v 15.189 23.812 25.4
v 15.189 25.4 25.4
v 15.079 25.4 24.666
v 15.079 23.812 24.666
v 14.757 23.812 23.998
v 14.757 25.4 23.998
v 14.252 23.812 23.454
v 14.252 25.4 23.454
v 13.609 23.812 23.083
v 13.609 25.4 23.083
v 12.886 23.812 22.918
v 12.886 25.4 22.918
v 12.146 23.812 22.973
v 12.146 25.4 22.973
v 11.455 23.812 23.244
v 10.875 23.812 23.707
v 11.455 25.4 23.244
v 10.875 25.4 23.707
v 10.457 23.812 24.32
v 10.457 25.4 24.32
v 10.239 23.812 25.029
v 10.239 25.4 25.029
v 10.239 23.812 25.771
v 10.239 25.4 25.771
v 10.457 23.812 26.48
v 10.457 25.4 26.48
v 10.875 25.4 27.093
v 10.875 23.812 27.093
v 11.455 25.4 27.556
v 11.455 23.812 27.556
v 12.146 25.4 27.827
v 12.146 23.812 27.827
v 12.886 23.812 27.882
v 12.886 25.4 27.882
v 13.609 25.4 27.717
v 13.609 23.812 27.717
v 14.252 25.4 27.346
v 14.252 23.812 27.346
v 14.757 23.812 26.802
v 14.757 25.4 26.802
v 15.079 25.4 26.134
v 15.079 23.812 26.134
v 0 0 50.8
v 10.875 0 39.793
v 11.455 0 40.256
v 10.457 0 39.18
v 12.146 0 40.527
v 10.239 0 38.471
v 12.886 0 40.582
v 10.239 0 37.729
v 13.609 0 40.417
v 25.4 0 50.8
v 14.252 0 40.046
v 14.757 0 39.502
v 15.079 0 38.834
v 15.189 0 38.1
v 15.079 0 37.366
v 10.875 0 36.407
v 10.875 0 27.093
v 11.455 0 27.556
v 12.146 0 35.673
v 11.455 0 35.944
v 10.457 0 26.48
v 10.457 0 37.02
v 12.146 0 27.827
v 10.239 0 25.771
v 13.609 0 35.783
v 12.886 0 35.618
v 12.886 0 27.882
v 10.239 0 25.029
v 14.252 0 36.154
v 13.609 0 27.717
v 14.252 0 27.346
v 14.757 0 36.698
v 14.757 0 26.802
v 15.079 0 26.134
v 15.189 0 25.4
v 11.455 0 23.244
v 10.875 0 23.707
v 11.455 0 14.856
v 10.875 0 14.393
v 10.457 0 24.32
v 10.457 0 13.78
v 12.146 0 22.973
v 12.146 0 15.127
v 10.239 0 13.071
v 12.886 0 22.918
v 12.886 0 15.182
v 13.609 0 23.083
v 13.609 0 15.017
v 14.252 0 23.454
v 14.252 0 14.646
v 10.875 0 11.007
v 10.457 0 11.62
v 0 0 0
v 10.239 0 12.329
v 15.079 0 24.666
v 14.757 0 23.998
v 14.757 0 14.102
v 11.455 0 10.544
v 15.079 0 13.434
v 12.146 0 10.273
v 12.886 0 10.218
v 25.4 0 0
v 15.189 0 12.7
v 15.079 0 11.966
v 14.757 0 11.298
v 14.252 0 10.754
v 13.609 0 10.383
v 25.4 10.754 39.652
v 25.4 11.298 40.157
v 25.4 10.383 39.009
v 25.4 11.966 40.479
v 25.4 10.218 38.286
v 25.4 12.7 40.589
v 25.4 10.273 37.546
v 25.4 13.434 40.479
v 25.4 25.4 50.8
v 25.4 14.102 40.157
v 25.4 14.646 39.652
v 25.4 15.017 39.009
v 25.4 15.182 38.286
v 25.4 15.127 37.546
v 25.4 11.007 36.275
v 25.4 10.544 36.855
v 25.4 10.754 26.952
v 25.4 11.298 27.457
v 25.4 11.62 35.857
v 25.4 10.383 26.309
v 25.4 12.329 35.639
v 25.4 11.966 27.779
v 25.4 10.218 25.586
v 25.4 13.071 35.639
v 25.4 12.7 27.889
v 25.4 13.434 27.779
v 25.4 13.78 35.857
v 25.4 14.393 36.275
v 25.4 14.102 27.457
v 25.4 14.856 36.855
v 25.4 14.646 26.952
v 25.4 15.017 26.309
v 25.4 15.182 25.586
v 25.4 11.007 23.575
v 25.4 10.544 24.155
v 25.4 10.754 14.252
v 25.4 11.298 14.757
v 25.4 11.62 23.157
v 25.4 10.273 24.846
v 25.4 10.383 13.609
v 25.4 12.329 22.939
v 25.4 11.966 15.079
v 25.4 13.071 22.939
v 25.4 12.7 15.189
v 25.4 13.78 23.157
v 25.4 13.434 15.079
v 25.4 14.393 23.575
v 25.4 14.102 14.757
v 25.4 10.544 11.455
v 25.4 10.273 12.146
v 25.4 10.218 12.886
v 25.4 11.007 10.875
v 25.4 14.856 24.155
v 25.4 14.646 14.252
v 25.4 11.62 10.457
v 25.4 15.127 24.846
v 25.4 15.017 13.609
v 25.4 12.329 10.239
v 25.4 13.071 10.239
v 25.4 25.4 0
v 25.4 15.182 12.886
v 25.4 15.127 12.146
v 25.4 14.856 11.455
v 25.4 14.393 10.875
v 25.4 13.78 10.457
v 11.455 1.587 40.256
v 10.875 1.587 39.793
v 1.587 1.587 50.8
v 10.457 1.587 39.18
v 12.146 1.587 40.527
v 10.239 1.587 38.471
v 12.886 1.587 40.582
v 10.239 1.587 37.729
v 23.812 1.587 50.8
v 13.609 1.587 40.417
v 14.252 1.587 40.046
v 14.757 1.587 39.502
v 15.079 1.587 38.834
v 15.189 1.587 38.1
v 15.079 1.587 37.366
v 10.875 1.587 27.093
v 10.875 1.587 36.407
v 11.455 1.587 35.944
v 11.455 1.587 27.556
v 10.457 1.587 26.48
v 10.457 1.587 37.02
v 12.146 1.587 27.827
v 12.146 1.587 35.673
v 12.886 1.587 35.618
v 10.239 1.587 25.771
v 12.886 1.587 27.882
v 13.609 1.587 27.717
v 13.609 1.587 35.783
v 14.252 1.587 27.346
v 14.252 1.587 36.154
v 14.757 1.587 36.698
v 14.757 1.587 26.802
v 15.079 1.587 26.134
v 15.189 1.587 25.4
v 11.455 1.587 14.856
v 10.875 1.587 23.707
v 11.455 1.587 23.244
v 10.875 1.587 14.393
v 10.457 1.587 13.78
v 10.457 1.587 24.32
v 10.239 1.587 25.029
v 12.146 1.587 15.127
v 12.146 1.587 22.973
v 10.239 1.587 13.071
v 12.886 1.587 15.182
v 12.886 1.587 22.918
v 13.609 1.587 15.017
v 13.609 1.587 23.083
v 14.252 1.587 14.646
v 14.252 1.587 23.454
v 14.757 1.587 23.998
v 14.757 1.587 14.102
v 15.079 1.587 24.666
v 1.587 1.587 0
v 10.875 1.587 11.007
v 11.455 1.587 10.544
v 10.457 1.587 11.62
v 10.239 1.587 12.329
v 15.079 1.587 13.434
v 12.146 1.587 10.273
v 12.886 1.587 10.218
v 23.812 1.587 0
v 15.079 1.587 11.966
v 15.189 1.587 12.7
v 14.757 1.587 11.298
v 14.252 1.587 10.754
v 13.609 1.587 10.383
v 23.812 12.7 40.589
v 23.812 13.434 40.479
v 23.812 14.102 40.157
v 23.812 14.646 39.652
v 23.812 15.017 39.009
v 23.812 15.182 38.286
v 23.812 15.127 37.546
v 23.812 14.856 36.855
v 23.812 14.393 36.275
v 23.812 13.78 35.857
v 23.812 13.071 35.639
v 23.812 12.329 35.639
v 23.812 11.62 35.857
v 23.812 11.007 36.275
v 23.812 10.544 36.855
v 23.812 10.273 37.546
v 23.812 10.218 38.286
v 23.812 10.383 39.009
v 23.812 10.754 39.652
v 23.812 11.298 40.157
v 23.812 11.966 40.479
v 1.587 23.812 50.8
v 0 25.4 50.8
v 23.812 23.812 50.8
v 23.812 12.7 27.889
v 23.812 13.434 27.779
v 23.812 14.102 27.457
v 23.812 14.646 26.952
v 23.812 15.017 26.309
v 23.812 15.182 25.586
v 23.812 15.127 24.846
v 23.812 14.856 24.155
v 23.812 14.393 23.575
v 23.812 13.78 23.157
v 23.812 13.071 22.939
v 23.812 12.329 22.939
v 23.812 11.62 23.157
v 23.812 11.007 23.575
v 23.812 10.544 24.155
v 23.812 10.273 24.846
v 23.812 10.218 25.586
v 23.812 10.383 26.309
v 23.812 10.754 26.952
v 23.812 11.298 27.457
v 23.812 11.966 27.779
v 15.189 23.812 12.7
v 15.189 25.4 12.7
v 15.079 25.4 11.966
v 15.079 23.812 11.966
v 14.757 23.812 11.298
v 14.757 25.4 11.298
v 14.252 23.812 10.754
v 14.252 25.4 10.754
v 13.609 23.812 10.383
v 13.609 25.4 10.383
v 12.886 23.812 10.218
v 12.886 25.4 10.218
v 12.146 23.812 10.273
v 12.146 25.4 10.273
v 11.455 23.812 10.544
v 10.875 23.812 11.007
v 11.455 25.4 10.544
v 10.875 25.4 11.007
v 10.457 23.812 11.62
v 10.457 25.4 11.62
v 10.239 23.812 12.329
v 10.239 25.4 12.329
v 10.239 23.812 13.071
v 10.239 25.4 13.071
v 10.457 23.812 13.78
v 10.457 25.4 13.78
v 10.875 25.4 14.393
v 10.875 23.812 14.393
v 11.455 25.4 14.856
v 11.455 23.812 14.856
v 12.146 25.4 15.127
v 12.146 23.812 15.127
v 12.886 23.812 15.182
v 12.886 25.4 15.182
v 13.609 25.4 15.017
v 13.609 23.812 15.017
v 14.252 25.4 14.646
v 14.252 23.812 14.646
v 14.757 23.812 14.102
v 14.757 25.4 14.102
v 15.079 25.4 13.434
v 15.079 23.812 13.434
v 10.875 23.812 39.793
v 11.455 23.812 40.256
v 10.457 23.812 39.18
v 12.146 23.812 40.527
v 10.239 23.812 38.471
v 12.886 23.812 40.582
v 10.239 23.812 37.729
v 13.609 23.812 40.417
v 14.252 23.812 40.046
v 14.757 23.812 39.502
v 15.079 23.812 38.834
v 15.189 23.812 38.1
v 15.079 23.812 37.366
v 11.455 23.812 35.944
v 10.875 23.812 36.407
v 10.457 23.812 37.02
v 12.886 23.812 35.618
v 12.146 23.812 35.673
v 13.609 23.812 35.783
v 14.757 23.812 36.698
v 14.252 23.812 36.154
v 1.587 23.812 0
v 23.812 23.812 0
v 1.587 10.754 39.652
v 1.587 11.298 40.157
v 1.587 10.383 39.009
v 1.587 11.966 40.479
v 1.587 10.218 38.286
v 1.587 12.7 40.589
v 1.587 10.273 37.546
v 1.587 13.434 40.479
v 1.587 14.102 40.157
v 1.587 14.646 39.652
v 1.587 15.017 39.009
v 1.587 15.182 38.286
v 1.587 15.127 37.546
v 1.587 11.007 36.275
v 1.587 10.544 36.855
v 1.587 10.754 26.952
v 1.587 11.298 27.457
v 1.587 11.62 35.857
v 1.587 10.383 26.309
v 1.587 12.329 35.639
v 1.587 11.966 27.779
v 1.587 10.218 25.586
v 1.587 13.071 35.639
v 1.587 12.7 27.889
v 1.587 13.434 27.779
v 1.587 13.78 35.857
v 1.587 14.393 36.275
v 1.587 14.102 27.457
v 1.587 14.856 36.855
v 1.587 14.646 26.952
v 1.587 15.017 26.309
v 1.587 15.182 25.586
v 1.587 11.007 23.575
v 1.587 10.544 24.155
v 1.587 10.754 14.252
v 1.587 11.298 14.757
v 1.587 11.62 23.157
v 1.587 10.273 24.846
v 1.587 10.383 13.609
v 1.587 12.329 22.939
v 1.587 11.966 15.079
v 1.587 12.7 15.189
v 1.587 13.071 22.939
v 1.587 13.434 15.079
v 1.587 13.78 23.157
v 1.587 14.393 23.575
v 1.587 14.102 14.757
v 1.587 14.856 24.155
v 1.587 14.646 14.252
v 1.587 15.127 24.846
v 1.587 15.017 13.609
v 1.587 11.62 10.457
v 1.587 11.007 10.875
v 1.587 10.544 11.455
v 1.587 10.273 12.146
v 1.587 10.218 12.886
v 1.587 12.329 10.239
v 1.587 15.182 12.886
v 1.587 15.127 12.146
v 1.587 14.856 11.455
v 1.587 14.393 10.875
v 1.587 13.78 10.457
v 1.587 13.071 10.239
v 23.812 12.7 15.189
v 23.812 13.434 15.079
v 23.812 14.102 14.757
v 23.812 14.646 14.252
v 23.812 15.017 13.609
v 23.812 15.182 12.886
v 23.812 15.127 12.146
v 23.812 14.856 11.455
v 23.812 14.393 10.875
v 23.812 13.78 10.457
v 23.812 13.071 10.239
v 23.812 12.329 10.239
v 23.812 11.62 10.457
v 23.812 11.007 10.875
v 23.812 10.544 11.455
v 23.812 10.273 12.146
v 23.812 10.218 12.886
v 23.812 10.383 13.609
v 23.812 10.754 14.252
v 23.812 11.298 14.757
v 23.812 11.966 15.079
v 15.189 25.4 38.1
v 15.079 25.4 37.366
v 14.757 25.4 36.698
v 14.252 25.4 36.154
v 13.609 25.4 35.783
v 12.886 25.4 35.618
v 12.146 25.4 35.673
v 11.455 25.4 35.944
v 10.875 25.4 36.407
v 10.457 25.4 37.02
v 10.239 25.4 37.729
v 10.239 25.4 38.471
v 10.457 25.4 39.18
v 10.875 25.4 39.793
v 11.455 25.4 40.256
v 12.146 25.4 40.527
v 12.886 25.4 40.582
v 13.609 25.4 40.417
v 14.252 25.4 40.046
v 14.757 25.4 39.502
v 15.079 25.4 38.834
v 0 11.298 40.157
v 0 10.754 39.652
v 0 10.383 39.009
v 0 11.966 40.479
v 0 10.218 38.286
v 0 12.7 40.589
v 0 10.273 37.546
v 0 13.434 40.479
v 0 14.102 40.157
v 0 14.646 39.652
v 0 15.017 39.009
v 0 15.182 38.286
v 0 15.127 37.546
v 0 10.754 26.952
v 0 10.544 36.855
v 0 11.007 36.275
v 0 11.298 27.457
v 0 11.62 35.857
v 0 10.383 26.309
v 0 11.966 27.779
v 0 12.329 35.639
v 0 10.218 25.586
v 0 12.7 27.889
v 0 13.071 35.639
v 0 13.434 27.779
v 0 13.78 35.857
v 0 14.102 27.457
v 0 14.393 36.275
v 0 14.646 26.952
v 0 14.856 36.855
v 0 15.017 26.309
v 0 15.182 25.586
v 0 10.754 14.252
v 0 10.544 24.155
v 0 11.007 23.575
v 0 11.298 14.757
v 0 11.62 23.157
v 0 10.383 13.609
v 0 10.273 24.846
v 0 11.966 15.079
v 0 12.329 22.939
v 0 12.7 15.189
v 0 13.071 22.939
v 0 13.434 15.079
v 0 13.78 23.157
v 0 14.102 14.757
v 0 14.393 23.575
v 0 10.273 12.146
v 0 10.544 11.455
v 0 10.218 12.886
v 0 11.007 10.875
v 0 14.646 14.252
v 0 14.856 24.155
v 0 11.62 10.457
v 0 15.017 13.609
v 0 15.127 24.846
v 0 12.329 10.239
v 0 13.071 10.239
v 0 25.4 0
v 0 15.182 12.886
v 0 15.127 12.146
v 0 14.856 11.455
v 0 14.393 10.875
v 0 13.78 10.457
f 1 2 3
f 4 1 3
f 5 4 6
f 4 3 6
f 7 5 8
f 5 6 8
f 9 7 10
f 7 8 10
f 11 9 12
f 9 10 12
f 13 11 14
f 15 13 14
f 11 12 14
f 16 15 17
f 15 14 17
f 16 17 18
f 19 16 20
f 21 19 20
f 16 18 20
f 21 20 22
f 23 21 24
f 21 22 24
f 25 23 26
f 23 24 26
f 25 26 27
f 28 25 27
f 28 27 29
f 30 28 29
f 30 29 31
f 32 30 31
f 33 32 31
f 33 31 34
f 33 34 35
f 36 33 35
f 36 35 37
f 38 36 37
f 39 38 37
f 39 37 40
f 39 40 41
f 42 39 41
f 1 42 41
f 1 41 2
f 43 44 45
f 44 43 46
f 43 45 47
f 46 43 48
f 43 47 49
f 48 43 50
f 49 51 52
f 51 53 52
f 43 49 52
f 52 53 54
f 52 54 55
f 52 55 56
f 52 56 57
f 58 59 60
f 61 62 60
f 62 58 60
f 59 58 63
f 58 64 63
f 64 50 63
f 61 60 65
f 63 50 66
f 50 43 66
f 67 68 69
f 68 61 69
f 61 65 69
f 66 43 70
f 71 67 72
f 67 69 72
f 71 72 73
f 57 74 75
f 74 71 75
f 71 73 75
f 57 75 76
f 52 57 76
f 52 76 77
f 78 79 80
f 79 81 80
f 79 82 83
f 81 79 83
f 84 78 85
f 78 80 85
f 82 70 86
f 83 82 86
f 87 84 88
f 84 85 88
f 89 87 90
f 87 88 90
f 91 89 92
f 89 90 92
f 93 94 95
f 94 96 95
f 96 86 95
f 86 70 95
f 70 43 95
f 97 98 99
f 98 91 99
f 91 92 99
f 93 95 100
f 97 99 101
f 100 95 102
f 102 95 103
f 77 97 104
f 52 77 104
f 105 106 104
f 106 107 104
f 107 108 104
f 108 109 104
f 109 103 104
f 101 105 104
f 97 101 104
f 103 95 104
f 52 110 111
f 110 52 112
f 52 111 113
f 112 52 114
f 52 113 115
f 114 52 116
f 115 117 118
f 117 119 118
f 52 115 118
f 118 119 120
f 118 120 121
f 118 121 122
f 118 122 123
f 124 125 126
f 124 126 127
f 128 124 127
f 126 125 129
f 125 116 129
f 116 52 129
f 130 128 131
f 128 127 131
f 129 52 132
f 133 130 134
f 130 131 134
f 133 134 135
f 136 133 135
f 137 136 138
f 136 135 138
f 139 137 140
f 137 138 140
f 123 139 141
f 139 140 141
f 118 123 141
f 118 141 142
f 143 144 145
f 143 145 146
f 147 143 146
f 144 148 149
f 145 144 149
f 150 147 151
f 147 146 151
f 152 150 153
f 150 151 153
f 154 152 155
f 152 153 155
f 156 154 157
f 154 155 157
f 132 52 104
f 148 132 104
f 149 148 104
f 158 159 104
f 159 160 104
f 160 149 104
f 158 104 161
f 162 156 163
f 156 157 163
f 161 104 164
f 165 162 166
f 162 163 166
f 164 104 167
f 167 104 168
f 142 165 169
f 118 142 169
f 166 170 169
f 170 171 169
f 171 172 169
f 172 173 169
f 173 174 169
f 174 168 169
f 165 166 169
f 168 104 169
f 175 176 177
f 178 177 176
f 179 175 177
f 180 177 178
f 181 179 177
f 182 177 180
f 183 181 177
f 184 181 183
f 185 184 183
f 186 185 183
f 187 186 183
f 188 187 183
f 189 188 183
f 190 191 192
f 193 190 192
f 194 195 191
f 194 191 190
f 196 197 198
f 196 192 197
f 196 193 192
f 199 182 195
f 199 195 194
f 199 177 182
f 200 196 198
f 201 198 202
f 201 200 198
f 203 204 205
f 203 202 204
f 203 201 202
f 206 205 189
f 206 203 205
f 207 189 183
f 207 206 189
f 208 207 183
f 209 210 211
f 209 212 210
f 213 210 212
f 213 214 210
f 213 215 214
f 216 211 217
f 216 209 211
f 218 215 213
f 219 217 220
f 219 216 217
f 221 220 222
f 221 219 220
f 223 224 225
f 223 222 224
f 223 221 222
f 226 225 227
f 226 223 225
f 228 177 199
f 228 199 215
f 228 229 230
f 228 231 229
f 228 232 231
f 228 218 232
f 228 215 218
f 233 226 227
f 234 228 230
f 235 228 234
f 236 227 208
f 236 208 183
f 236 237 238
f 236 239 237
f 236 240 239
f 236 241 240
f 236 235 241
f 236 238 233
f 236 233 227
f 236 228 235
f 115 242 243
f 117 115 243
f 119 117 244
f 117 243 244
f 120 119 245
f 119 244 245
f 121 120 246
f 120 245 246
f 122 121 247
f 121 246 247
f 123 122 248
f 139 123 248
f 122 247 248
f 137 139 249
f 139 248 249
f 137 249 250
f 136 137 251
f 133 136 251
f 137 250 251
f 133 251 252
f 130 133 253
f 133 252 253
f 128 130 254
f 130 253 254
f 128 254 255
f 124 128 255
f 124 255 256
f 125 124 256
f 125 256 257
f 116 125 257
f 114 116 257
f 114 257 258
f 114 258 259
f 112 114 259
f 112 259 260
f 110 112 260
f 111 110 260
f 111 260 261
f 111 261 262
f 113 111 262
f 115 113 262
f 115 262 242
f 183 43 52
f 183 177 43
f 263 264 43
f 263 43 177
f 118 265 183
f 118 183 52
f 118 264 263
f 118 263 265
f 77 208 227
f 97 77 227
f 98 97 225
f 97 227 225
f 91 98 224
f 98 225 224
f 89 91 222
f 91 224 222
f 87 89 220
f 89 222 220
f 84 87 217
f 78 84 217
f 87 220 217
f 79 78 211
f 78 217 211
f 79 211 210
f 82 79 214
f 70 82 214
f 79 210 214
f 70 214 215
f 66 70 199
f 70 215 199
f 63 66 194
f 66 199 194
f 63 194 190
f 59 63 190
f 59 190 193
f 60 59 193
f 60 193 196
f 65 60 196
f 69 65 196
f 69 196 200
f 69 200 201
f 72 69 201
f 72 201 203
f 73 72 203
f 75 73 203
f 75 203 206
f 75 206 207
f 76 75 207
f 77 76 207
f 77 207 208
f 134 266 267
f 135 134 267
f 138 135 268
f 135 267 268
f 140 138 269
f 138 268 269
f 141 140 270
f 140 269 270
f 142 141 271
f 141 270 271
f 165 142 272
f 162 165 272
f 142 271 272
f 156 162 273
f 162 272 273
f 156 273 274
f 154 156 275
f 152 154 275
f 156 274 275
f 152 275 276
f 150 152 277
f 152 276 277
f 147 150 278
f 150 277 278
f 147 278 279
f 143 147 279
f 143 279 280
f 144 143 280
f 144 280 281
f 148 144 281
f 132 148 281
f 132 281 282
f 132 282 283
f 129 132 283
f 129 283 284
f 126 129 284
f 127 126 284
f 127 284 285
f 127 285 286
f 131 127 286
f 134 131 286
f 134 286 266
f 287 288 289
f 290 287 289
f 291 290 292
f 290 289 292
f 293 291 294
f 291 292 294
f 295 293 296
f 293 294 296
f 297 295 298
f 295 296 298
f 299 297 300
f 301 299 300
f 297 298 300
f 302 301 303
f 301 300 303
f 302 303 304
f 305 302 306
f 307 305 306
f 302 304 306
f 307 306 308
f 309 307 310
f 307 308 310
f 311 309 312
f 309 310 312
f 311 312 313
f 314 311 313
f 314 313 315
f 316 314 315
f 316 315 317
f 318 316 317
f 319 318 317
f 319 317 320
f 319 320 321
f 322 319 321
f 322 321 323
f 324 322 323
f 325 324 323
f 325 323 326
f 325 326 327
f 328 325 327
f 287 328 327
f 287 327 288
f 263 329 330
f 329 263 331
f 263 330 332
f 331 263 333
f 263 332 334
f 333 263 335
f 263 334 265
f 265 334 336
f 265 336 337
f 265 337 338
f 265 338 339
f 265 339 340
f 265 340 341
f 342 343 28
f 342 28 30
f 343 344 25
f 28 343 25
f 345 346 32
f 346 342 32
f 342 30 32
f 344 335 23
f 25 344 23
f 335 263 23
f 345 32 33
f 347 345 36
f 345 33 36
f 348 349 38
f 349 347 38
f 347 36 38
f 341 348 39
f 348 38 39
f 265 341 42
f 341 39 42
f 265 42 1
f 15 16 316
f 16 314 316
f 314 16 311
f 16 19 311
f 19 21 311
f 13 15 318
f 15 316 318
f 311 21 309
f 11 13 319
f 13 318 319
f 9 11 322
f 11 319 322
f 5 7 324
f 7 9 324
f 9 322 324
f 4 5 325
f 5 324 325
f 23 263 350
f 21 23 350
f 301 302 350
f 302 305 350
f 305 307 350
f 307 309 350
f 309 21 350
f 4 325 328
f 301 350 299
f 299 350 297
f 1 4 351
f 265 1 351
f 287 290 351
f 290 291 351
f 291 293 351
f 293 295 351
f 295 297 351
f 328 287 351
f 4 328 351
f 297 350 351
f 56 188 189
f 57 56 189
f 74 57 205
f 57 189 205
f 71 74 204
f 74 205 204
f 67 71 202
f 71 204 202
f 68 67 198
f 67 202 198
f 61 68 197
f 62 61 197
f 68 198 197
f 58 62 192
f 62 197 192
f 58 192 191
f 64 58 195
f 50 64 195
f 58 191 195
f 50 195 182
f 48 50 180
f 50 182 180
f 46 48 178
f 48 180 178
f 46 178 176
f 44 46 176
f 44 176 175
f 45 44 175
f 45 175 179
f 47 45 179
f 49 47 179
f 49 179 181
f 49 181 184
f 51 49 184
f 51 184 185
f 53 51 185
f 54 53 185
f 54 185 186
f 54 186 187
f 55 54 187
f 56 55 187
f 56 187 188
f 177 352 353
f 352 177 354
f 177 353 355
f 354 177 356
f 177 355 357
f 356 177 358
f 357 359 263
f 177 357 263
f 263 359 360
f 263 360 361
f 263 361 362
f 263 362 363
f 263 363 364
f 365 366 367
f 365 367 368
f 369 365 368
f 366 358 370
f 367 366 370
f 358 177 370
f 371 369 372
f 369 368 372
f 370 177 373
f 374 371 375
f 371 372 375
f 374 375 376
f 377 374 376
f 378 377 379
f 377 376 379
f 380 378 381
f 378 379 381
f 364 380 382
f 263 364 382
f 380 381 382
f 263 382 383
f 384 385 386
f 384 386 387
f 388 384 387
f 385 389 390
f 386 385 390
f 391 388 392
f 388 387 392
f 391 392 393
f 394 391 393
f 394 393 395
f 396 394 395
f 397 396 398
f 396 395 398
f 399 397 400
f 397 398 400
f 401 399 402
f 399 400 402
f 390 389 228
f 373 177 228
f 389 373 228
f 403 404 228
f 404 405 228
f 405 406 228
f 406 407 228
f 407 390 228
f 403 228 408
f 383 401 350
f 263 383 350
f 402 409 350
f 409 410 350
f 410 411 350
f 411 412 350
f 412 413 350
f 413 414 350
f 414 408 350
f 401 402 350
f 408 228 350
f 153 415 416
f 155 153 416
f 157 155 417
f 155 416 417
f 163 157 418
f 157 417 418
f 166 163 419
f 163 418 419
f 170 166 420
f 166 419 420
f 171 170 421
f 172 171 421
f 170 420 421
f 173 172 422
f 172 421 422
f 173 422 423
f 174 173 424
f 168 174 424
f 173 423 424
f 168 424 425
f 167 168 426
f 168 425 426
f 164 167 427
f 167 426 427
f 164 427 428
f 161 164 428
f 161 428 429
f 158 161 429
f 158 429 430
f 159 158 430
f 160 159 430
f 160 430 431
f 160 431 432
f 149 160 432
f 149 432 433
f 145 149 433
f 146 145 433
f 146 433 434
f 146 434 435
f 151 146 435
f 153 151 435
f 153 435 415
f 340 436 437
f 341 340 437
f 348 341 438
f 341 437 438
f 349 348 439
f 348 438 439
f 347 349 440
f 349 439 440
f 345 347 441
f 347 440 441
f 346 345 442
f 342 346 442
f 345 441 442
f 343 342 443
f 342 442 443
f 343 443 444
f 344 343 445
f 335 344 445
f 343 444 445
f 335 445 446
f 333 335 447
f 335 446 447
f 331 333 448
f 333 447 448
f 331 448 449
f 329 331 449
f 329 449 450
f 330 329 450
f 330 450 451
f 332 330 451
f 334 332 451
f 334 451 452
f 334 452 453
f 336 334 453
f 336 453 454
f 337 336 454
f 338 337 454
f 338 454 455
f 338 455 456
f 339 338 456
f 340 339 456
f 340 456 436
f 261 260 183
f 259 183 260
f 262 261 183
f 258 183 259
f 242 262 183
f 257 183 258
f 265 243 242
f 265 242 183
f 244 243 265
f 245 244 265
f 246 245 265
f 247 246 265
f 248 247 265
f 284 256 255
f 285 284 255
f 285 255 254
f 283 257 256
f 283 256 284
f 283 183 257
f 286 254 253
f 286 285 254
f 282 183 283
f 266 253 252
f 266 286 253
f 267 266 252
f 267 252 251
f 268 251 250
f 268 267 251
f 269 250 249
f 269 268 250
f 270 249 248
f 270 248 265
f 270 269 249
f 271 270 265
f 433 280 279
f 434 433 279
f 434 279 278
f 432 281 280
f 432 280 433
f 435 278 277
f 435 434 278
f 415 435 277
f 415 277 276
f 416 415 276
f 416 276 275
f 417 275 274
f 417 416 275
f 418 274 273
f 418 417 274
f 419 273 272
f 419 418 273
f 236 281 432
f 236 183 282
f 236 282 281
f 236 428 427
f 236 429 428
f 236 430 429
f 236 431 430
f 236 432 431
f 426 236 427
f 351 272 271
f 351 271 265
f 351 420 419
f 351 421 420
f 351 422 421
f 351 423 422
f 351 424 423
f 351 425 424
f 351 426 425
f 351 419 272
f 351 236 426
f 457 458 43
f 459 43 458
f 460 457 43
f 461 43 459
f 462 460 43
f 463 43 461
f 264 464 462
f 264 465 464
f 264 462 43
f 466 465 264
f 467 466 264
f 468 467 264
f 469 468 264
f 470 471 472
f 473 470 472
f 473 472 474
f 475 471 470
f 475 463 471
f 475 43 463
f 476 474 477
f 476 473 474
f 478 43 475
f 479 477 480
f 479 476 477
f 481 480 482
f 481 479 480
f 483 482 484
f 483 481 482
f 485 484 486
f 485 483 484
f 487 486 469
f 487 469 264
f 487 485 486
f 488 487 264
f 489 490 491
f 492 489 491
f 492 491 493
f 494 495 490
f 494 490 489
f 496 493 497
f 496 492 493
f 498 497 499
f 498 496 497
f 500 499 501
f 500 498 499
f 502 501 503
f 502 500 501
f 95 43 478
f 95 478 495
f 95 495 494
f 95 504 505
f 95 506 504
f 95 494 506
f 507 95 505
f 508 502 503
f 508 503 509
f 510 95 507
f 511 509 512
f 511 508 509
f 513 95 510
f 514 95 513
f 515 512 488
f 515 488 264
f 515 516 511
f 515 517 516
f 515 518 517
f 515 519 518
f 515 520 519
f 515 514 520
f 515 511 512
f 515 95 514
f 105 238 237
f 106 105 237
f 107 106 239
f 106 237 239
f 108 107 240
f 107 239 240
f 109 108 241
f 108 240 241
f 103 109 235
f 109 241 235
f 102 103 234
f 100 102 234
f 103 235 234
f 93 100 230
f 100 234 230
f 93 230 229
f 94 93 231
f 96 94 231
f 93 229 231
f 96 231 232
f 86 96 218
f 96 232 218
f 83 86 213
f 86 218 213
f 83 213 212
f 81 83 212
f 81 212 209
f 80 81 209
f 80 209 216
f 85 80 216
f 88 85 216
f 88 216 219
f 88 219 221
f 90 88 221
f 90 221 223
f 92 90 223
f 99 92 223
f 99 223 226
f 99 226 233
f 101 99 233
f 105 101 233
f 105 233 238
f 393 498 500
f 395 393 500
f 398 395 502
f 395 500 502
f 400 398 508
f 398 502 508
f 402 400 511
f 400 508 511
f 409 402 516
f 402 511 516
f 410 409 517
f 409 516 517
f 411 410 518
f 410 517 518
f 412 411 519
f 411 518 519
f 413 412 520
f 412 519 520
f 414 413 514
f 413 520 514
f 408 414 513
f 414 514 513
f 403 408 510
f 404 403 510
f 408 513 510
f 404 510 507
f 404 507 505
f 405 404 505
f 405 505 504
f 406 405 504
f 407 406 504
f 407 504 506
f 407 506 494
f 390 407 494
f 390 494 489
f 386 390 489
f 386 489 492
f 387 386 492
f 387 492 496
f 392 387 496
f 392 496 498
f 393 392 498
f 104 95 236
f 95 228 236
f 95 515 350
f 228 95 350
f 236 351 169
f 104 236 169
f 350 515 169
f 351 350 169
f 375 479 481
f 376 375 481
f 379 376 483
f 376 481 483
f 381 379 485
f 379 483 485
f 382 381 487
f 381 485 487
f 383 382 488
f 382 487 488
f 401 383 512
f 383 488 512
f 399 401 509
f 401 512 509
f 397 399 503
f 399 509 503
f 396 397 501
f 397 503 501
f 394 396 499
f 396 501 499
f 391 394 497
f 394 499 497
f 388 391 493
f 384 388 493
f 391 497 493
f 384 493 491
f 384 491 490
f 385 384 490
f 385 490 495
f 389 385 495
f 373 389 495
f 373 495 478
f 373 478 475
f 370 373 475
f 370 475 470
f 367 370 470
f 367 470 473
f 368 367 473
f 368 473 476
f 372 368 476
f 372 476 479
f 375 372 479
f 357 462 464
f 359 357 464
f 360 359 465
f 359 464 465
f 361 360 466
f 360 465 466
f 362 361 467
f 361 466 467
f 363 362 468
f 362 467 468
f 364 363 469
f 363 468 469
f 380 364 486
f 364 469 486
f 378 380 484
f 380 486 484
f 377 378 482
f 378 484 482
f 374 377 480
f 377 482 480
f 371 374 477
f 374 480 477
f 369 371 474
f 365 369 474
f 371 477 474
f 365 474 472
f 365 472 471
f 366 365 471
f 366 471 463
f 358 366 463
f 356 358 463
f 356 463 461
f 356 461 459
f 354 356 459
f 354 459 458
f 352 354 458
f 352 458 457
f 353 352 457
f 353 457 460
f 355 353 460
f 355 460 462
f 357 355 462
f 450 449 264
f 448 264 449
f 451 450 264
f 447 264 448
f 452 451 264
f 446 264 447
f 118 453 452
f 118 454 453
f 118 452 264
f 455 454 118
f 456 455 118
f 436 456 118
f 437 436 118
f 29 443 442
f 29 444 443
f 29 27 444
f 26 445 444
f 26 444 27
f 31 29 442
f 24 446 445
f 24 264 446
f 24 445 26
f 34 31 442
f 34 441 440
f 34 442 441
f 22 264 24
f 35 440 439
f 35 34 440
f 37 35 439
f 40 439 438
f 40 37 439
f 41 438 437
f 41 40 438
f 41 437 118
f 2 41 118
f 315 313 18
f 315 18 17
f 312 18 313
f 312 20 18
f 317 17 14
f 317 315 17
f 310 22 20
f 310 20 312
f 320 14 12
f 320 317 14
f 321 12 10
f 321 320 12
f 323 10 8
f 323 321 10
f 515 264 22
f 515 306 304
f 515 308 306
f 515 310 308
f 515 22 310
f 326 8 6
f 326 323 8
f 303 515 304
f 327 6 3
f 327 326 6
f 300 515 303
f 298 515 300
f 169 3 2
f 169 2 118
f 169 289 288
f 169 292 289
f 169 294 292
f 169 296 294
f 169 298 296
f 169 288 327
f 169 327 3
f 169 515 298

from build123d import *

# Parameters (mm, degrees)
SKETCH1_W           = 25.4
SKETCH1_H           = 25.4
SKETCH1_W_2         = 22.225
SKETCH1_H_2         = 22.225
BOSS_EXTRUDE1_DEPTH = 50.8
SKETCH2_R           = 2.4892
CUT_EXTRUDE1_DEPTH  = 26.4
SKETCH3_R           = 2.4892
CUT_EXTRUDE2_DEPTH  = 26.4


with BuildPart() as part:
    # Sketch1 → Boss-Extrude1 (new body)
    with BuildSketch(Plane.XY):
        with Locations((12.7, 12.7)):
            Rectangle(SKETCH1_W, SKETCH1_H)
        with Locations((12.7, 12.7)):
            Rectangle(SKETCH1_W_2, SKETCH1_H_2, mode=Mode.SUBTRACT)
    extrude(amount=BOSS_EXTRUDE1_DEPTH)

    # Sketch2 → Cut-Extrude1 (cut, through all)
    with BuildSketch(Plane(origin=(0, 25.4, 0), x_dir=(1, 0, 0), z_dir=(0, 1, 0))):
        with Locations((12.7, -12.7)):
            Circle(SKETCH2_R)
        with Locations((12.7, -25.4)):
            Circle(SKETCH2_R)
        with Locations((12.7, -38.1)):
            Circle(SKETCH2_R)
    extrude(amount=-CUT_EXTRUDE1_DEPTH, mode=Mode.SUBTRACT)

    # Sketch3 → Cut-Extrude2 (cut, through all)
    with BuildSketch(Plane.ZY):
        with Locations((12.7, 12.7)):
            Circle(SKETCH3_R)
        with Locations((25.4, 12.7)):
            Circle(SKETCH3_R)
        with Locations((38.1, 12.7)):
            Circle(SKETCH3_R)
    extrude(amount=-CUT_EXTRUDE2_DEPTH, mode=Mode.SUBTRACT)


solid = part.part
